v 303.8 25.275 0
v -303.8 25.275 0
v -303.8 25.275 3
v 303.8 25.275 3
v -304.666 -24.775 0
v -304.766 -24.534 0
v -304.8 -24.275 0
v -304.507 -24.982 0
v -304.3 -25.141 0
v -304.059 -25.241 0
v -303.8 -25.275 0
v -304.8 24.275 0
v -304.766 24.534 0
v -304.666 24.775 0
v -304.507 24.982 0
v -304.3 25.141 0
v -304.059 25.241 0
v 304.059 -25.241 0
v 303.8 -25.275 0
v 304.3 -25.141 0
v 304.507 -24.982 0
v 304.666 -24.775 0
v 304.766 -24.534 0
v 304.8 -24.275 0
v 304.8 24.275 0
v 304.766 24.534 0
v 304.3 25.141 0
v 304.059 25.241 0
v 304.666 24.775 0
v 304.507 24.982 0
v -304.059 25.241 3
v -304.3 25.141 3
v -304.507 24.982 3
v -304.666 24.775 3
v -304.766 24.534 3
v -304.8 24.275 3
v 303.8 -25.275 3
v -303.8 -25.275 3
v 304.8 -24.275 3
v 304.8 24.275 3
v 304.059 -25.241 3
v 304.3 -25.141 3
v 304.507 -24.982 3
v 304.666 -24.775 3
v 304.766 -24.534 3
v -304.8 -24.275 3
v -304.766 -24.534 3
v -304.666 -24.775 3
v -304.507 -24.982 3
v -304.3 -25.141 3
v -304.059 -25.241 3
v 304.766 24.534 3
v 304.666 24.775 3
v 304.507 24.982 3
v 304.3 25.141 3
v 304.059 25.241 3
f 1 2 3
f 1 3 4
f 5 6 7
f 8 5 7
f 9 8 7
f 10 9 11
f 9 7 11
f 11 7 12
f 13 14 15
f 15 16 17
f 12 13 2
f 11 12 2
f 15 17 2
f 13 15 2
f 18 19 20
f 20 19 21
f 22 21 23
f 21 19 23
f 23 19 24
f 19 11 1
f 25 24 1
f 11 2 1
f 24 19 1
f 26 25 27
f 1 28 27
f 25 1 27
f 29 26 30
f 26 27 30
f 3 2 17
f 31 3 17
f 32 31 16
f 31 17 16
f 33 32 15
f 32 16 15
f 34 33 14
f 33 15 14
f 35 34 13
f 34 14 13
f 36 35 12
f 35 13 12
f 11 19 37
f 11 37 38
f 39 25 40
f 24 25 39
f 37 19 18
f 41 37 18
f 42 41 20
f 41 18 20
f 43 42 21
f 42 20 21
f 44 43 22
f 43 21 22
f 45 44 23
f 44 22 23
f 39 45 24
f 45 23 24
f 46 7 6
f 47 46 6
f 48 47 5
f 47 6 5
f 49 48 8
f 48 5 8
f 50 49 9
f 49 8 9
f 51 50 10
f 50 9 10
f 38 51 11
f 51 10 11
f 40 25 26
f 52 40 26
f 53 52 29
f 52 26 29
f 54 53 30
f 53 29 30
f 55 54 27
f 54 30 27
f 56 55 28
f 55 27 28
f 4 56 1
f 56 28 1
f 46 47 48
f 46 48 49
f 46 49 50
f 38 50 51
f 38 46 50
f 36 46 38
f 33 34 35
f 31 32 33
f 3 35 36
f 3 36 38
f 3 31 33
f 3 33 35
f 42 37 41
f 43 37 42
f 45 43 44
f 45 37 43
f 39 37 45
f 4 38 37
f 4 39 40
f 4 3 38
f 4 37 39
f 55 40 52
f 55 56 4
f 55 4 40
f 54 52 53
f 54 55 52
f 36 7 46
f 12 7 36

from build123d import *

# Parameters (mm, degrees)
PAD_DEPTH = 3


with BuildPart() as part:
    # Sketch → Pad (new body)
    with BuildSketch(Plane.XY):
        with BuildLine():
            ThreePointArc((-303.8, 25.275), (-304.507107, 24.982107), (-304.8, 24.275))
            Line((-304.8, -24.275), (-304.8, 24.275))
            ThreePointArc((-304.8, -24.275), (-304.507107, -24.982107), (-303.8, -25.275))
            Line((303.8, -25.275), (-303.8, -25.275))
            ThreePointArc((303.8, -25.275), (304.507107, -24.982107), (304.8, -24.275))
            Line((304.8, 24.275), (304.8, -24.275))
            ThreePointArc((304.8, 24.275), (304.507107, 24.982107), (303.8, 25.275))
            Line((-303.8, 25.275), (303.8, 25.275))
        make_face()
    extrude(amount=PAD_DEPTH)


solid = part.part
